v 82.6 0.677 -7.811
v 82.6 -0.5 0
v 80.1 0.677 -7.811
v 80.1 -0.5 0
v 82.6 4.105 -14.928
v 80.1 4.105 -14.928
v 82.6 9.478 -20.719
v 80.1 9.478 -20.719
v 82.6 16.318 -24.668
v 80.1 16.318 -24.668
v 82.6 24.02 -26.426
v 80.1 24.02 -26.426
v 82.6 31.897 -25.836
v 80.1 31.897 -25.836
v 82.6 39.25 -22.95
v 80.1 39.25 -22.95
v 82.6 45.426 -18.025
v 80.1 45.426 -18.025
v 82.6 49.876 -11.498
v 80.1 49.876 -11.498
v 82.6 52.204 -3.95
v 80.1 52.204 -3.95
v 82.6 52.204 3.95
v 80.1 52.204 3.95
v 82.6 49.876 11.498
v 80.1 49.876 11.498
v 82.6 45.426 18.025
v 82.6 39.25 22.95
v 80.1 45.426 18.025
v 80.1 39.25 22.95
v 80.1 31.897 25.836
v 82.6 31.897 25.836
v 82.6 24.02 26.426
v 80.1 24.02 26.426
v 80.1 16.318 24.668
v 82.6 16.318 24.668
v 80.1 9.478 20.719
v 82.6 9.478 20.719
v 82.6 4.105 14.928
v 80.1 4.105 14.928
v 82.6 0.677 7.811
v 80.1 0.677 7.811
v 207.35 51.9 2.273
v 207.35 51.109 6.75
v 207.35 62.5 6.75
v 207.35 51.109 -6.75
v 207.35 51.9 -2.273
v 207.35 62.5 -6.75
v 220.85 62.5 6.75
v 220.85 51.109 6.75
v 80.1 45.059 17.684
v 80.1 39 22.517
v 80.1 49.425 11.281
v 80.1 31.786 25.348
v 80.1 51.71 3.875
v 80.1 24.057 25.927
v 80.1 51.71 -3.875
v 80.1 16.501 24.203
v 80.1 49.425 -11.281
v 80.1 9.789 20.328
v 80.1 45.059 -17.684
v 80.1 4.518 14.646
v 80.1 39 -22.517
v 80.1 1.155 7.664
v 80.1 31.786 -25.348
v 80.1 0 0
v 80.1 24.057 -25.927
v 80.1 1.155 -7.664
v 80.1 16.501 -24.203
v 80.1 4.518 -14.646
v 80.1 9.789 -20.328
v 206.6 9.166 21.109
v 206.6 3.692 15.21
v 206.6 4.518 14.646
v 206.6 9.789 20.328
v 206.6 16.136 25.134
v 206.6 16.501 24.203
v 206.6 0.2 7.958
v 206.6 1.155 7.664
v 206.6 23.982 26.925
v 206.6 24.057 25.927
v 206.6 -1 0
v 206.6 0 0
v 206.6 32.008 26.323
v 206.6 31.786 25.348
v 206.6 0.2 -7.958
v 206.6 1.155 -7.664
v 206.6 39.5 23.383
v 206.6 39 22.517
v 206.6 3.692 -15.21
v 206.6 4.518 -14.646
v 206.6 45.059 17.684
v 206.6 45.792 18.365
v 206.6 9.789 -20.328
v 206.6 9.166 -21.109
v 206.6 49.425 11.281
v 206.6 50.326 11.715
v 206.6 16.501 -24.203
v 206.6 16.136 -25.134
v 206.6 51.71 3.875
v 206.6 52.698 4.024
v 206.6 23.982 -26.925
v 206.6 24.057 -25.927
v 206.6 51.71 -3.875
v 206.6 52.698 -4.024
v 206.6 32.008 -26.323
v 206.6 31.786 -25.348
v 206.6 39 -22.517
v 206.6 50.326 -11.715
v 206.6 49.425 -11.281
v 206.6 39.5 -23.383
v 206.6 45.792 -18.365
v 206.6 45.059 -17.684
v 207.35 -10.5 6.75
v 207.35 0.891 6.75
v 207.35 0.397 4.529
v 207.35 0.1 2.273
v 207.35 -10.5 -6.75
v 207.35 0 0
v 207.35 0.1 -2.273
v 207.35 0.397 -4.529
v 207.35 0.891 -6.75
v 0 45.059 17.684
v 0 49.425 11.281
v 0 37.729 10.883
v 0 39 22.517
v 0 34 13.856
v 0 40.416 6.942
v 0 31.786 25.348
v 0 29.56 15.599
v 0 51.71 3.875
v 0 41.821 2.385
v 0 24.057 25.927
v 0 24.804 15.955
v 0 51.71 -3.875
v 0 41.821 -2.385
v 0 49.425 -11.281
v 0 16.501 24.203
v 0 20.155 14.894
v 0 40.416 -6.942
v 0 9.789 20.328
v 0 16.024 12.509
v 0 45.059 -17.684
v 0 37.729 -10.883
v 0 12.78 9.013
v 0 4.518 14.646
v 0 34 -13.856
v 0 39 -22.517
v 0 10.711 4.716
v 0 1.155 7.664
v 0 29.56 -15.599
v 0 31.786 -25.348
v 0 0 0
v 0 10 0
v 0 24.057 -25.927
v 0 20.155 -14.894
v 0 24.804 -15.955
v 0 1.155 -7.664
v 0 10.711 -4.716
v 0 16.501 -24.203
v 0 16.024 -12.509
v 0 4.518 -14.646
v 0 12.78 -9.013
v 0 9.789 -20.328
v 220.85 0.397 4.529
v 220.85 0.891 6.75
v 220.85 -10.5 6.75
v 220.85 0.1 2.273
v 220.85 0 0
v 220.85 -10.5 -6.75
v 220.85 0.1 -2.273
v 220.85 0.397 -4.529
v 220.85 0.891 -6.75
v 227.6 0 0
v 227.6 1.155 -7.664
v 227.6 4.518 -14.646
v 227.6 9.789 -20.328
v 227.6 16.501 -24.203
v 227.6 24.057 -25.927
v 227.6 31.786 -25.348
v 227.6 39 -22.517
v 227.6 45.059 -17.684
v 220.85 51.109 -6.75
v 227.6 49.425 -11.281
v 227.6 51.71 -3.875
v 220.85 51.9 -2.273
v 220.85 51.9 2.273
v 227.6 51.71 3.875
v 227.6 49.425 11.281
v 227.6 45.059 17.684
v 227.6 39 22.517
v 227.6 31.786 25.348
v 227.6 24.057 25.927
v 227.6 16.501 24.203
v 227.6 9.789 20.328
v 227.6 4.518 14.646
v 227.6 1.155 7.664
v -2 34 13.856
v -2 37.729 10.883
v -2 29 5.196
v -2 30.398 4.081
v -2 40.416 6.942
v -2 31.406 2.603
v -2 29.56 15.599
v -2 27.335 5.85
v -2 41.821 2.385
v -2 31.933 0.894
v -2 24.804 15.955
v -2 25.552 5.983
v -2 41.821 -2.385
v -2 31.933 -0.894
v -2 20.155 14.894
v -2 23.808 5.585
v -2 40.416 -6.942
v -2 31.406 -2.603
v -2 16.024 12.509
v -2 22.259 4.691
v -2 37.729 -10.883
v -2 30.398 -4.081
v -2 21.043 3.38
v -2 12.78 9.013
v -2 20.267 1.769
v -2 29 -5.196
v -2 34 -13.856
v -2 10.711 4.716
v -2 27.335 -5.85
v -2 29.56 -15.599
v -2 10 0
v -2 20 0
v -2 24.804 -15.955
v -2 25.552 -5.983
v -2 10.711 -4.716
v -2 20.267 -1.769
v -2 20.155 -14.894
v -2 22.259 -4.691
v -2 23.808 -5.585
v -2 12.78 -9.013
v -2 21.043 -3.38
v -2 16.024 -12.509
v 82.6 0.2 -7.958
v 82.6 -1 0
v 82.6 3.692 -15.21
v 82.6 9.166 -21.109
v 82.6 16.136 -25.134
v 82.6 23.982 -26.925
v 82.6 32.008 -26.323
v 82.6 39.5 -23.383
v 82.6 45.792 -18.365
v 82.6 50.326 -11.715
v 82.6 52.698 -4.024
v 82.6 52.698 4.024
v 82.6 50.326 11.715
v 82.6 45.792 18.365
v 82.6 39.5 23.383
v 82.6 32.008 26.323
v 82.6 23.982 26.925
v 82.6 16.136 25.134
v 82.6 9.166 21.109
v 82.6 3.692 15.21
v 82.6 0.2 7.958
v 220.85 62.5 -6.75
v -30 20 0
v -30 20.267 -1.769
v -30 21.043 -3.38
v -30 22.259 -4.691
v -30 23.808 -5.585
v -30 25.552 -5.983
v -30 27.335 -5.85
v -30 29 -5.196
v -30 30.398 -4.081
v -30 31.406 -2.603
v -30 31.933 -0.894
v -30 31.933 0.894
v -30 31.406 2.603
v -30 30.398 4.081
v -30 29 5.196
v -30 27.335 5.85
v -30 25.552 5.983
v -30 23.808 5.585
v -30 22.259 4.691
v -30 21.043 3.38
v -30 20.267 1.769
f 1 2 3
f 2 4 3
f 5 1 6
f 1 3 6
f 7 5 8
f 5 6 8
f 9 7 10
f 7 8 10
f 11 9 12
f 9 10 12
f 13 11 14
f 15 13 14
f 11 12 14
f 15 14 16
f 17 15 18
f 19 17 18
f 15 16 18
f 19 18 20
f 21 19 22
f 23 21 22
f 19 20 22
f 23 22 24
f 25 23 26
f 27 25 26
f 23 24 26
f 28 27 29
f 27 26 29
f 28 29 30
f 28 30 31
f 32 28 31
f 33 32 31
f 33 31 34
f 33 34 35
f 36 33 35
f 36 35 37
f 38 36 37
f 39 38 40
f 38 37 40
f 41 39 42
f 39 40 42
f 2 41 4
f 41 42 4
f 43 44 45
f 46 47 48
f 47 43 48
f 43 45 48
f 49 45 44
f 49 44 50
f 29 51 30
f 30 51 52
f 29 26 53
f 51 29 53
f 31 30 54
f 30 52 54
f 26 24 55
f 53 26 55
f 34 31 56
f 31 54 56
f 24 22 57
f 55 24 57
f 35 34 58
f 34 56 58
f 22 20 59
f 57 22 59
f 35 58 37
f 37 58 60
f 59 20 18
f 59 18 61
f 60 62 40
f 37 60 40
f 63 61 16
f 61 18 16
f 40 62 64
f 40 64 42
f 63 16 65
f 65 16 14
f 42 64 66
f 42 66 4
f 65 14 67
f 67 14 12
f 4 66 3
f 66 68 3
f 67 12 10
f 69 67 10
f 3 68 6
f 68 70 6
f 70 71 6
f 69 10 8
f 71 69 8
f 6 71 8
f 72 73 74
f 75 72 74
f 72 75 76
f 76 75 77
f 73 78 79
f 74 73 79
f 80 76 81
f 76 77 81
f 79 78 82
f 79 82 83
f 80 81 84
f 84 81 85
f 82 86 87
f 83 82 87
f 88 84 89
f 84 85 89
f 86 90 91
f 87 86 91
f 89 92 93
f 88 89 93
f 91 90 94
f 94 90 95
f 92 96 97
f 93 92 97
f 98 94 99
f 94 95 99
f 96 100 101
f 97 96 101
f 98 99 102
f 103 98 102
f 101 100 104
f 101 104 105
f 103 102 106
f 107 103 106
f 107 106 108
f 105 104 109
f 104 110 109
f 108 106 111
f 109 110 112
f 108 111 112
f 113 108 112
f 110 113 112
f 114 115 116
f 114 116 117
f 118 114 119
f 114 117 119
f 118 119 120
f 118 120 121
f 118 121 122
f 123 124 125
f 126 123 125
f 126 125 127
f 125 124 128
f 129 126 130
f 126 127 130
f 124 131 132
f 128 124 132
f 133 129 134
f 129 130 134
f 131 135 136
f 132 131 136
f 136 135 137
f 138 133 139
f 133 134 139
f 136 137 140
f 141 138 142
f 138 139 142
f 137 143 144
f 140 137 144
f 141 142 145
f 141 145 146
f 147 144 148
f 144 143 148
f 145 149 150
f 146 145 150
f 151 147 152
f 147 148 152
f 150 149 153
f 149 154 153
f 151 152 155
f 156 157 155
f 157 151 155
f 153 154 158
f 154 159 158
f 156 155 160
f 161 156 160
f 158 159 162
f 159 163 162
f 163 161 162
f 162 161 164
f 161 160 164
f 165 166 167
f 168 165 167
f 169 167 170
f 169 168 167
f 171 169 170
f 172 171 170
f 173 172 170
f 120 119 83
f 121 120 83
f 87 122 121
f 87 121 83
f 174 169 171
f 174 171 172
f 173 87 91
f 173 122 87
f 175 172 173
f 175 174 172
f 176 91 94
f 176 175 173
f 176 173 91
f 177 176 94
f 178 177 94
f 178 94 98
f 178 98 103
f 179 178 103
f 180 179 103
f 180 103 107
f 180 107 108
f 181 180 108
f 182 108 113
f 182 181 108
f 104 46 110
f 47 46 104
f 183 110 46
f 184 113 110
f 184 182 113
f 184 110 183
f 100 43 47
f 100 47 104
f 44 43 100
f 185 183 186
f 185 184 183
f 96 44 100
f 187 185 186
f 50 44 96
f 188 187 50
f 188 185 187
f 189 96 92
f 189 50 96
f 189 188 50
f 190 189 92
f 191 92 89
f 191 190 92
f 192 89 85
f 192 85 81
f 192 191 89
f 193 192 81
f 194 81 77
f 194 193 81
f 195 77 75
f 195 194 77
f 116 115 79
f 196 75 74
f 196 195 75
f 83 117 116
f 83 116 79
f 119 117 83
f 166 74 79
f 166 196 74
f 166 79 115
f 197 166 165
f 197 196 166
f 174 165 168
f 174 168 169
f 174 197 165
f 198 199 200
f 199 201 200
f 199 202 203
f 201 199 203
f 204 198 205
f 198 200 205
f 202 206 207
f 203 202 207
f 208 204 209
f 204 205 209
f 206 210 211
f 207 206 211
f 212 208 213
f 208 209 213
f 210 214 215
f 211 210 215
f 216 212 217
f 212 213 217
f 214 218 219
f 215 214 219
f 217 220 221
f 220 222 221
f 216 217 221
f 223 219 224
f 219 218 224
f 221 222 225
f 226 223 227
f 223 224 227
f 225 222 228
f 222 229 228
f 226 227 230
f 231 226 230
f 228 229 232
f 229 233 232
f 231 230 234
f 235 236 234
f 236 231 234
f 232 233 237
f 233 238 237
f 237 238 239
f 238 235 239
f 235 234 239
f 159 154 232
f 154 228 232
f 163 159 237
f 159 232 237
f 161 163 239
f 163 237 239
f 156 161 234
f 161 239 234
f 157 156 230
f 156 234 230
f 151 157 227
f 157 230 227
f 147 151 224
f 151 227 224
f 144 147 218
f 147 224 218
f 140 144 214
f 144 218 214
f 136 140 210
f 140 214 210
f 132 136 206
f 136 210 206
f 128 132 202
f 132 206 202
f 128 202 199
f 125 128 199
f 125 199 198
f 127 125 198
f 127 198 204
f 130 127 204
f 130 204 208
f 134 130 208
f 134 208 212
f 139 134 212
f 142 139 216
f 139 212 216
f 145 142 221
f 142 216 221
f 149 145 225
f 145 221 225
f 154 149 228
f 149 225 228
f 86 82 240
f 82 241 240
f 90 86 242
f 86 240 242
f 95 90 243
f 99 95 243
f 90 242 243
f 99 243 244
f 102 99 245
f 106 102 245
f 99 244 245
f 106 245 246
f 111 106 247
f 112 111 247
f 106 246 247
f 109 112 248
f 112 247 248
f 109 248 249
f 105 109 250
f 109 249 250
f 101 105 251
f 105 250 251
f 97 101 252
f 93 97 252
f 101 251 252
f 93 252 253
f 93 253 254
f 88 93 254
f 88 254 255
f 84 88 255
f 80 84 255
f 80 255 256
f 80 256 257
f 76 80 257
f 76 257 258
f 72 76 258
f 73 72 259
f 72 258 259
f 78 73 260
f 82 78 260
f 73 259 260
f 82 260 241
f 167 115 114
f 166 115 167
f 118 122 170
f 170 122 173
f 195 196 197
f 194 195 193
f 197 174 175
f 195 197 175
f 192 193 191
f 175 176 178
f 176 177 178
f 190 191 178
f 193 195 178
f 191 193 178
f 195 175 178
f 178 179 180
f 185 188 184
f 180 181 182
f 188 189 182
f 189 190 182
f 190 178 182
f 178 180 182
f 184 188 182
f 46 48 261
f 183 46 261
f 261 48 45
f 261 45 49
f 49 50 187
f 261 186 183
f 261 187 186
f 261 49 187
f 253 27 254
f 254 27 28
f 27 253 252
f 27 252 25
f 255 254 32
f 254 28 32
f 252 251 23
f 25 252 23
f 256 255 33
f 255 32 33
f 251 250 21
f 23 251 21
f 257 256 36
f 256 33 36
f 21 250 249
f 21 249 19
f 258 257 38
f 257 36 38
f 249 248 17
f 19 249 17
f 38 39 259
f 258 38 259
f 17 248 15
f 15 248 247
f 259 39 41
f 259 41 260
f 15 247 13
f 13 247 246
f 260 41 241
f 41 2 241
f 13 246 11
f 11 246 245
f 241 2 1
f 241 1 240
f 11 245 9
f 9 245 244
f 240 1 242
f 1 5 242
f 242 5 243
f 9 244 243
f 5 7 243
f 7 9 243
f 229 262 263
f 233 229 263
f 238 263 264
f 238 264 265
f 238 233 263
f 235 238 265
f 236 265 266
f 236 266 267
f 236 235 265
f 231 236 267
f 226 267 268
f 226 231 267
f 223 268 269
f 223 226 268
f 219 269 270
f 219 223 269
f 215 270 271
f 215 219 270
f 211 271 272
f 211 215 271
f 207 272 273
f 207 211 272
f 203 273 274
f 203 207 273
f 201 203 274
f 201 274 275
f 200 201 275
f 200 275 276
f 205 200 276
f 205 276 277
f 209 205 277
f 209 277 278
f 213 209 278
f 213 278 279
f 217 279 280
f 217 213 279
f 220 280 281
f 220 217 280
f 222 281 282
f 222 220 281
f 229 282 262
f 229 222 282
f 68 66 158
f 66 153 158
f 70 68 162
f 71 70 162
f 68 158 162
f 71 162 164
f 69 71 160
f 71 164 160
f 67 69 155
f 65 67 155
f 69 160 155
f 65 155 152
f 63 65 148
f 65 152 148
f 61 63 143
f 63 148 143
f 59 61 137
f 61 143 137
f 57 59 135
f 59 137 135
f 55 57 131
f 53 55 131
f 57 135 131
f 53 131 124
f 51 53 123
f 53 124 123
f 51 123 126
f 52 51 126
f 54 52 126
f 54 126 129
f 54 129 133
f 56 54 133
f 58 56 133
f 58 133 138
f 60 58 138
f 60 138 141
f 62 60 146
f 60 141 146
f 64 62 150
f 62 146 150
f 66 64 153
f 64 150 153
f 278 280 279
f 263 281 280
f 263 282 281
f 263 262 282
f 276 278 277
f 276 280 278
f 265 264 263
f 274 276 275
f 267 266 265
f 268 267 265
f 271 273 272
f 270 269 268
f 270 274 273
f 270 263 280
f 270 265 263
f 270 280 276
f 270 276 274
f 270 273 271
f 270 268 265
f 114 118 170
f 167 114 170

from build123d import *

# Parameters (mm, degrees)
SKETCH1_W           = 21
SKETCH1_H           = 26
SKETCH1_W_2         = 28
SKETCH1_H_2         = 6
BOSS_EXTRUDE1_START = 26
SKETCH2_W           = 13.5
SKETCH2_H           = 13.5
BOSS_EXTRUDE1_DEPTH = 36.5


with BuildPart() as part:
    # Sketch1 → Revolve1 (revolve)
    with BuildSketch(Plane.XY, mode=Mode.PRIVATE) as revolve1_sk:
        with Locations((217.1, 39)):
            Rectangle(SKETCH1_W, SKETCH1_H)
        Polygon((82.6, 52.5), (82.6, 26), (206.6, 26), (206.6, 52), (206.6, 53), (82.6, 53), align=None)
        Polygon((80.1, 52), (80.1, 26), (82.6, 26), (82.6, 52.5), (80.1, 52.5), align=None)
        Polygon((0, 42), (0, 26), (80.1, 26), (80.1, 52), (0, 52), align=None)
        Polygon((-2, 32), (-2, 26), (0, 26), (0, 42), (-2, 42), align=None)
        with Locations((-16, 29)):
            Rectangle(SKETCH1_W_2, SKETCH1_H_2)
    revolve(revolve1_sk.sketch.rotate(Axis((-30, 26, 0), (1, 0, 0)), 180), axis=Axis((-30, 26, 0), (1, 0, 0)))

    # Sketch2 → Boss-Extrude1 (add, symmetric)
    with BuildSketch(Plane(origin=(0, 0, 0), x_dir=(1, 0, 0), z_dir=(0, 1, 0)).offset(BOSS_EXTRUDE1_START)):
        with Locations((214.1, 0)):
            Rectangle(SKETCH2_W, SKETCH2_H)
    extrude(amount=BOSS_EXTRUDE1_DEPTH, both=True)


solid = part.part
